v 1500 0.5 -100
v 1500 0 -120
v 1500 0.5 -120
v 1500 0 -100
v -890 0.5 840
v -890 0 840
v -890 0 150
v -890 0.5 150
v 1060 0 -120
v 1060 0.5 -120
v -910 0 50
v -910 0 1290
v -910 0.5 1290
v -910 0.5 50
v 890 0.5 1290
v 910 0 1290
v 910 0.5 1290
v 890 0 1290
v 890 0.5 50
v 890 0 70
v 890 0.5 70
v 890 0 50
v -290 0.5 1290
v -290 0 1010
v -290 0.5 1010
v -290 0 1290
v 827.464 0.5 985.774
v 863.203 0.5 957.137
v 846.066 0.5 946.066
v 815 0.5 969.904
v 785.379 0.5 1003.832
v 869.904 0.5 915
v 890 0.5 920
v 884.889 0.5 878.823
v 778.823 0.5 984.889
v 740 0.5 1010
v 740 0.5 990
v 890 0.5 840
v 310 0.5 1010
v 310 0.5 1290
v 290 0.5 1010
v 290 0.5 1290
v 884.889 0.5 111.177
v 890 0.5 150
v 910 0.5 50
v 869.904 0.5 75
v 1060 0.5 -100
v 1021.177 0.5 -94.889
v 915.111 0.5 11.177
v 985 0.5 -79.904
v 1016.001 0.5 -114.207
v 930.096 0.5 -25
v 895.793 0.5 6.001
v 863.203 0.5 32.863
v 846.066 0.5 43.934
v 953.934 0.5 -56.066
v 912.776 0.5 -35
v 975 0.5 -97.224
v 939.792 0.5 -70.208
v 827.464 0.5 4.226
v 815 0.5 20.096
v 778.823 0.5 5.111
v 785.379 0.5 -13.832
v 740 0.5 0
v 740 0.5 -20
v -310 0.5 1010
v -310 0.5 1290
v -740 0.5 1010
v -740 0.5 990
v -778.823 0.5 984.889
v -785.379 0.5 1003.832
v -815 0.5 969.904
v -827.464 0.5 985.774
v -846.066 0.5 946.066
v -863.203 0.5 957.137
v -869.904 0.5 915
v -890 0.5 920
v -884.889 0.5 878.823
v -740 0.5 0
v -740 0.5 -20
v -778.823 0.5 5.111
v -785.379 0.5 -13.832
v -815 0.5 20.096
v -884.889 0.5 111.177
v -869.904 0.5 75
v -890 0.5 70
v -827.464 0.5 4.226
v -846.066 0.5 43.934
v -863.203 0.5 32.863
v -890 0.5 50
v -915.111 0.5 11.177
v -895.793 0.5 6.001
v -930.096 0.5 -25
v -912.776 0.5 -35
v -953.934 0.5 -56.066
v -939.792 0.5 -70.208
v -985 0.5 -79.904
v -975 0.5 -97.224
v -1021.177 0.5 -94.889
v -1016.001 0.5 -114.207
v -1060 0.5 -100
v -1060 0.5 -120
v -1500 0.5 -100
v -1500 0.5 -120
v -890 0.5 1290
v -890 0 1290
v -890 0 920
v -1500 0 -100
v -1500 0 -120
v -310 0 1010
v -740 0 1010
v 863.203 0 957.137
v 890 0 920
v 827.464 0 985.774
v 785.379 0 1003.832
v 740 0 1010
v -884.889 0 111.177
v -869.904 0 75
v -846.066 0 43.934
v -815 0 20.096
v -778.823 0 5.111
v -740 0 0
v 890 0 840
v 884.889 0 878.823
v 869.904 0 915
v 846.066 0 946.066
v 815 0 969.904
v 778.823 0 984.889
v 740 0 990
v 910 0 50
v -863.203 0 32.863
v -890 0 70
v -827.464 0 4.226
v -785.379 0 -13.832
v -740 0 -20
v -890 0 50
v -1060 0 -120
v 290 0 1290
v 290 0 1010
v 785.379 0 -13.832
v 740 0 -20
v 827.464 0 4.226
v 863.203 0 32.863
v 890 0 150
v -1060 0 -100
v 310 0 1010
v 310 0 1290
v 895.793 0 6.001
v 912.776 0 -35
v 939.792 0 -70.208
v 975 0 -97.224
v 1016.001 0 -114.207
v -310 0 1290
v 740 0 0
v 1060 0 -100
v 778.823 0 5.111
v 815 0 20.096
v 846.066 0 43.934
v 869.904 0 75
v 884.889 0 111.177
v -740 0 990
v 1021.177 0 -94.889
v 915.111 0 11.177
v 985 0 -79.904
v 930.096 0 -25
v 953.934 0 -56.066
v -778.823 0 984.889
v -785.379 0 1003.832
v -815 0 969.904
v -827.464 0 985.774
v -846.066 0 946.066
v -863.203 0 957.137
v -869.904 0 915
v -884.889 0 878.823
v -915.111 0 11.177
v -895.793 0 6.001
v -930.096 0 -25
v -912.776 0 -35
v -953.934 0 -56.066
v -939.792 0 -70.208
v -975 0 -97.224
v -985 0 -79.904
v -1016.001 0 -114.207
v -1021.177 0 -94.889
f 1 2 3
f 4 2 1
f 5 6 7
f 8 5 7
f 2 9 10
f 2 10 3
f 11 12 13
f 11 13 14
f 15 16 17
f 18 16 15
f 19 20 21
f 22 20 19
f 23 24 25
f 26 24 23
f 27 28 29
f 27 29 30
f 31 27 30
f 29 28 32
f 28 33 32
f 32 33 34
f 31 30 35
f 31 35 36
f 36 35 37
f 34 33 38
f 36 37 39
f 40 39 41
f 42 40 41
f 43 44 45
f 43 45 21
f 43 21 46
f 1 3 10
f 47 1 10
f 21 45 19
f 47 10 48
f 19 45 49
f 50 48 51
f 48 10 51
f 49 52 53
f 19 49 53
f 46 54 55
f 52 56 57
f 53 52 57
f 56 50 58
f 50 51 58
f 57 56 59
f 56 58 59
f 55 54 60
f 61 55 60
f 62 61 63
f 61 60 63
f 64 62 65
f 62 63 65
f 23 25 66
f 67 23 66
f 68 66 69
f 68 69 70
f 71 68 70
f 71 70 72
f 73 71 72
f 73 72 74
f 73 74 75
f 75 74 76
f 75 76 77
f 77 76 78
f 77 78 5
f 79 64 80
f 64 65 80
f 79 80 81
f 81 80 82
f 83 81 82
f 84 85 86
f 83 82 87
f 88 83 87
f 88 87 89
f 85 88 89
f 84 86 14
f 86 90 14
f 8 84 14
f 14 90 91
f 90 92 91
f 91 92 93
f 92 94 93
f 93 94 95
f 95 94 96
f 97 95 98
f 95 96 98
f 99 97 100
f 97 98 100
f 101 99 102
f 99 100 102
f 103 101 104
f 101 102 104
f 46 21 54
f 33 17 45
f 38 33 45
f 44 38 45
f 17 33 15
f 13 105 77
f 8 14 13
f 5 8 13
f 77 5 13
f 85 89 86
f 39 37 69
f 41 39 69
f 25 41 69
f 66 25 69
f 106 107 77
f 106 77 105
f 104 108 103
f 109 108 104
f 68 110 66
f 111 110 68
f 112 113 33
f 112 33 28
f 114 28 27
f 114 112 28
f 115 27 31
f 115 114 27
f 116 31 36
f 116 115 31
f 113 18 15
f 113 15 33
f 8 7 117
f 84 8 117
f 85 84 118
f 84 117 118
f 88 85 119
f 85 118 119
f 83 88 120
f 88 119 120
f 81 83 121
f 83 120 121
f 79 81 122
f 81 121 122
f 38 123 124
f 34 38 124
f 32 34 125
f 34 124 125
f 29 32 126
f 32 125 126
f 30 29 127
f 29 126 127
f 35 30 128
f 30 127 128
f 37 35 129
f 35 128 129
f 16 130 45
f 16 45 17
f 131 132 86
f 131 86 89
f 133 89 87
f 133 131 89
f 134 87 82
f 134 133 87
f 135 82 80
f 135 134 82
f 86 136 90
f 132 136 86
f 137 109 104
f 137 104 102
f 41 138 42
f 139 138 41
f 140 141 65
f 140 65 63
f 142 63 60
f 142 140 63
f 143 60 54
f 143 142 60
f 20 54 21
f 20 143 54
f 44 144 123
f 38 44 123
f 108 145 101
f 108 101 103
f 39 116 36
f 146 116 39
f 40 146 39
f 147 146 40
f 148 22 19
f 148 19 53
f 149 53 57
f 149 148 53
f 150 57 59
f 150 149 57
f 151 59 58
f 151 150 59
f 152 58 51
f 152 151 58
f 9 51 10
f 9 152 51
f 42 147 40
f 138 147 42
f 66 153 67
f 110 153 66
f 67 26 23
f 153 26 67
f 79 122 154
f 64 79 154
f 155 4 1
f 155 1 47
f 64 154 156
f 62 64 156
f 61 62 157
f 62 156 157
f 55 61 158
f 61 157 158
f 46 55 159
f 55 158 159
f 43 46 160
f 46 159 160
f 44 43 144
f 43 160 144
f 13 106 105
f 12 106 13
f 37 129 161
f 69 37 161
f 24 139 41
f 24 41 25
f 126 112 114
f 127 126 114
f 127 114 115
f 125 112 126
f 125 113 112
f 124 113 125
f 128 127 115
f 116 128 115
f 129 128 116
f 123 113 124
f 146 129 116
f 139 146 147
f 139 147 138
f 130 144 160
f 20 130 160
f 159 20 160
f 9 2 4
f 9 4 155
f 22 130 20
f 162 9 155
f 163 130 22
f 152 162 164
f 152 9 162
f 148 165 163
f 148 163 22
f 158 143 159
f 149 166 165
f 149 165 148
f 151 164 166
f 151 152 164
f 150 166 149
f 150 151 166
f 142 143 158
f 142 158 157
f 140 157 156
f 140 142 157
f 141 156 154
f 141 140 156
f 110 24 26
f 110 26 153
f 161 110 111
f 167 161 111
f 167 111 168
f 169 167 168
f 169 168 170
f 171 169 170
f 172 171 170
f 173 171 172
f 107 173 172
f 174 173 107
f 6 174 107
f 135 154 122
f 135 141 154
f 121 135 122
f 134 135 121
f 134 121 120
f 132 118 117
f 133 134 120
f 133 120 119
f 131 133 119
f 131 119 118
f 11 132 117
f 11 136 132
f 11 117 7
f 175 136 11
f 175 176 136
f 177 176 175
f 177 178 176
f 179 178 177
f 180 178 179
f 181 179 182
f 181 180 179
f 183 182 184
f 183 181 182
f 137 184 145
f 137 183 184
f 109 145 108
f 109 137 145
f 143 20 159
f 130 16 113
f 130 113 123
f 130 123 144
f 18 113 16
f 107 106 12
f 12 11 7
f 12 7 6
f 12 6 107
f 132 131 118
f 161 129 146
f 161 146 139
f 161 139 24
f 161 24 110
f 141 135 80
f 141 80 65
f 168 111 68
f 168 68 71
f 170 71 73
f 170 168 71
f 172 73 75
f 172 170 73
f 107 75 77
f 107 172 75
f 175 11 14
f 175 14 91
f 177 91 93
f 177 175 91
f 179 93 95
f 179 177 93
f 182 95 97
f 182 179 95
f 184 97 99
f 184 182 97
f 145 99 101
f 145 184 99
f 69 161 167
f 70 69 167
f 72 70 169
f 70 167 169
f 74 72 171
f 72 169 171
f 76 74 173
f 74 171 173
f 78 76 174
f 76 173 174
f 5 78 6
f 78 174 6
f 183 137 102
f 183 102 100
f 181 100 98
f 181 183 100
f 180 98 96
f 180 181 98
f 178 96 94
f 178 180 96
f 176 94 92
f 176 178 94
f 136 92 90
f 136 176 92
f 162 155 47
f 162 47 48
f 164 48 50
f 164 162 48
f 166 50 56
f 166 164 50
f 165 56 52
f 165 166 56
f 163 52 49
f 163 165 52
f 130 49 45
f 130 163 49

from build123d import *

# Parameters (mm, degrees)
EXTRUSION1_DEPTH = 0.5


with BuildPart() as part:
    # Esquisse1 → Extrusion1 (new body)
    with BuildSketch(Plane(origin=(0, 0, 0), x_dir=(1, 0, 0), z_dir=(0, 1, 0))):
        with BuildLine():
            Line((-740, 20), (740, 20))
            ThreePointArc((740, 20), (827.464278423, -4.226202629), (890, -70))
            Line((890, -70), (890, -50))
            ThreePointArc((890, -50), (939.791847198, 70.208152802), (1060, 120))
            Line((1060, 120), (1500, 120))
            Line((1500, 120), (1500, 100))
            Line((1500, 100), (1060, 100))
            ThreePointArc((1060, 100), (953.933982822, 56.066017178), (910, -50))
            Line((910, -50), (910, -1290))
            Line((910, -1290), (890, -1290))
            Line((890, -1290), (890, -920))
            ThreePointArc((890, -920), (827.464278423, -985.773797371), (740, -1010))
            Line((740, -1010), (310, -1010))
            Line((310, -1010), (310, -1290))
            Line((310, -1290), (290, -1290))
            Line((290, -1290), (290, -1010))
            Line((290, -1010), (-290, -1010))
            Line((-290, -1010), (-290, -1290))
            Line((-290, -1290), (-310, -1290))
            Line((-310, -1290), (-310, -1010))
            Line((-310, -1010), (-740, -1010))
            ThreePointArc((-740, -1010), (-827.464278423, -985.773797371), (-890, -920))
            Line((-890, -920), (-890, -1290))
            Line((-890, -1290), (-910, -1290))
            Line((-910, -1290), (-910, -50))
            ThreePointArc((-910, -50), (-953.933982822, 56.066017178), (-1060, 100))
            Line((-1060, 100), (-1500, 100))
            Line((-1500, 100), (-1500, 120))
            Line((-1500, 120), (-1060, 120))
            ThreePointArc((-1060, 120), (-939.791847198, 70.208152802), (-890, -50))
            Line((-890, -50), (-890, -70))
            ThreePointArc((-890, -70), (-827.464278423, -4.226202629), (-740, 20))
        make_face()
        with BuildLine():
            Line((-740, 0), (740, 0))
            ThreePointArc((740, 0), (846.066017178, -43.933982822), (890, -150))
            Line((890, -150), (890, -840))
            ThreePointArc((890, -840), (846.066017178, -946.066017178), (740, -990))
            Line((740, -990), (-740, -990))
            ThreePointArc((-740, -990), (-846.066017178, -946.066017178), (-890, -840))
            Line((-890, -840), (-890, -150))
            ThreePointArc((-890, -150), (-846.066017178, -43.933982822), (-740, 0))
        make_face(mode=Mode.SUBTRACT)
    extrude(amount=EXTRUSION1_DEPTH)


solid = part.part
